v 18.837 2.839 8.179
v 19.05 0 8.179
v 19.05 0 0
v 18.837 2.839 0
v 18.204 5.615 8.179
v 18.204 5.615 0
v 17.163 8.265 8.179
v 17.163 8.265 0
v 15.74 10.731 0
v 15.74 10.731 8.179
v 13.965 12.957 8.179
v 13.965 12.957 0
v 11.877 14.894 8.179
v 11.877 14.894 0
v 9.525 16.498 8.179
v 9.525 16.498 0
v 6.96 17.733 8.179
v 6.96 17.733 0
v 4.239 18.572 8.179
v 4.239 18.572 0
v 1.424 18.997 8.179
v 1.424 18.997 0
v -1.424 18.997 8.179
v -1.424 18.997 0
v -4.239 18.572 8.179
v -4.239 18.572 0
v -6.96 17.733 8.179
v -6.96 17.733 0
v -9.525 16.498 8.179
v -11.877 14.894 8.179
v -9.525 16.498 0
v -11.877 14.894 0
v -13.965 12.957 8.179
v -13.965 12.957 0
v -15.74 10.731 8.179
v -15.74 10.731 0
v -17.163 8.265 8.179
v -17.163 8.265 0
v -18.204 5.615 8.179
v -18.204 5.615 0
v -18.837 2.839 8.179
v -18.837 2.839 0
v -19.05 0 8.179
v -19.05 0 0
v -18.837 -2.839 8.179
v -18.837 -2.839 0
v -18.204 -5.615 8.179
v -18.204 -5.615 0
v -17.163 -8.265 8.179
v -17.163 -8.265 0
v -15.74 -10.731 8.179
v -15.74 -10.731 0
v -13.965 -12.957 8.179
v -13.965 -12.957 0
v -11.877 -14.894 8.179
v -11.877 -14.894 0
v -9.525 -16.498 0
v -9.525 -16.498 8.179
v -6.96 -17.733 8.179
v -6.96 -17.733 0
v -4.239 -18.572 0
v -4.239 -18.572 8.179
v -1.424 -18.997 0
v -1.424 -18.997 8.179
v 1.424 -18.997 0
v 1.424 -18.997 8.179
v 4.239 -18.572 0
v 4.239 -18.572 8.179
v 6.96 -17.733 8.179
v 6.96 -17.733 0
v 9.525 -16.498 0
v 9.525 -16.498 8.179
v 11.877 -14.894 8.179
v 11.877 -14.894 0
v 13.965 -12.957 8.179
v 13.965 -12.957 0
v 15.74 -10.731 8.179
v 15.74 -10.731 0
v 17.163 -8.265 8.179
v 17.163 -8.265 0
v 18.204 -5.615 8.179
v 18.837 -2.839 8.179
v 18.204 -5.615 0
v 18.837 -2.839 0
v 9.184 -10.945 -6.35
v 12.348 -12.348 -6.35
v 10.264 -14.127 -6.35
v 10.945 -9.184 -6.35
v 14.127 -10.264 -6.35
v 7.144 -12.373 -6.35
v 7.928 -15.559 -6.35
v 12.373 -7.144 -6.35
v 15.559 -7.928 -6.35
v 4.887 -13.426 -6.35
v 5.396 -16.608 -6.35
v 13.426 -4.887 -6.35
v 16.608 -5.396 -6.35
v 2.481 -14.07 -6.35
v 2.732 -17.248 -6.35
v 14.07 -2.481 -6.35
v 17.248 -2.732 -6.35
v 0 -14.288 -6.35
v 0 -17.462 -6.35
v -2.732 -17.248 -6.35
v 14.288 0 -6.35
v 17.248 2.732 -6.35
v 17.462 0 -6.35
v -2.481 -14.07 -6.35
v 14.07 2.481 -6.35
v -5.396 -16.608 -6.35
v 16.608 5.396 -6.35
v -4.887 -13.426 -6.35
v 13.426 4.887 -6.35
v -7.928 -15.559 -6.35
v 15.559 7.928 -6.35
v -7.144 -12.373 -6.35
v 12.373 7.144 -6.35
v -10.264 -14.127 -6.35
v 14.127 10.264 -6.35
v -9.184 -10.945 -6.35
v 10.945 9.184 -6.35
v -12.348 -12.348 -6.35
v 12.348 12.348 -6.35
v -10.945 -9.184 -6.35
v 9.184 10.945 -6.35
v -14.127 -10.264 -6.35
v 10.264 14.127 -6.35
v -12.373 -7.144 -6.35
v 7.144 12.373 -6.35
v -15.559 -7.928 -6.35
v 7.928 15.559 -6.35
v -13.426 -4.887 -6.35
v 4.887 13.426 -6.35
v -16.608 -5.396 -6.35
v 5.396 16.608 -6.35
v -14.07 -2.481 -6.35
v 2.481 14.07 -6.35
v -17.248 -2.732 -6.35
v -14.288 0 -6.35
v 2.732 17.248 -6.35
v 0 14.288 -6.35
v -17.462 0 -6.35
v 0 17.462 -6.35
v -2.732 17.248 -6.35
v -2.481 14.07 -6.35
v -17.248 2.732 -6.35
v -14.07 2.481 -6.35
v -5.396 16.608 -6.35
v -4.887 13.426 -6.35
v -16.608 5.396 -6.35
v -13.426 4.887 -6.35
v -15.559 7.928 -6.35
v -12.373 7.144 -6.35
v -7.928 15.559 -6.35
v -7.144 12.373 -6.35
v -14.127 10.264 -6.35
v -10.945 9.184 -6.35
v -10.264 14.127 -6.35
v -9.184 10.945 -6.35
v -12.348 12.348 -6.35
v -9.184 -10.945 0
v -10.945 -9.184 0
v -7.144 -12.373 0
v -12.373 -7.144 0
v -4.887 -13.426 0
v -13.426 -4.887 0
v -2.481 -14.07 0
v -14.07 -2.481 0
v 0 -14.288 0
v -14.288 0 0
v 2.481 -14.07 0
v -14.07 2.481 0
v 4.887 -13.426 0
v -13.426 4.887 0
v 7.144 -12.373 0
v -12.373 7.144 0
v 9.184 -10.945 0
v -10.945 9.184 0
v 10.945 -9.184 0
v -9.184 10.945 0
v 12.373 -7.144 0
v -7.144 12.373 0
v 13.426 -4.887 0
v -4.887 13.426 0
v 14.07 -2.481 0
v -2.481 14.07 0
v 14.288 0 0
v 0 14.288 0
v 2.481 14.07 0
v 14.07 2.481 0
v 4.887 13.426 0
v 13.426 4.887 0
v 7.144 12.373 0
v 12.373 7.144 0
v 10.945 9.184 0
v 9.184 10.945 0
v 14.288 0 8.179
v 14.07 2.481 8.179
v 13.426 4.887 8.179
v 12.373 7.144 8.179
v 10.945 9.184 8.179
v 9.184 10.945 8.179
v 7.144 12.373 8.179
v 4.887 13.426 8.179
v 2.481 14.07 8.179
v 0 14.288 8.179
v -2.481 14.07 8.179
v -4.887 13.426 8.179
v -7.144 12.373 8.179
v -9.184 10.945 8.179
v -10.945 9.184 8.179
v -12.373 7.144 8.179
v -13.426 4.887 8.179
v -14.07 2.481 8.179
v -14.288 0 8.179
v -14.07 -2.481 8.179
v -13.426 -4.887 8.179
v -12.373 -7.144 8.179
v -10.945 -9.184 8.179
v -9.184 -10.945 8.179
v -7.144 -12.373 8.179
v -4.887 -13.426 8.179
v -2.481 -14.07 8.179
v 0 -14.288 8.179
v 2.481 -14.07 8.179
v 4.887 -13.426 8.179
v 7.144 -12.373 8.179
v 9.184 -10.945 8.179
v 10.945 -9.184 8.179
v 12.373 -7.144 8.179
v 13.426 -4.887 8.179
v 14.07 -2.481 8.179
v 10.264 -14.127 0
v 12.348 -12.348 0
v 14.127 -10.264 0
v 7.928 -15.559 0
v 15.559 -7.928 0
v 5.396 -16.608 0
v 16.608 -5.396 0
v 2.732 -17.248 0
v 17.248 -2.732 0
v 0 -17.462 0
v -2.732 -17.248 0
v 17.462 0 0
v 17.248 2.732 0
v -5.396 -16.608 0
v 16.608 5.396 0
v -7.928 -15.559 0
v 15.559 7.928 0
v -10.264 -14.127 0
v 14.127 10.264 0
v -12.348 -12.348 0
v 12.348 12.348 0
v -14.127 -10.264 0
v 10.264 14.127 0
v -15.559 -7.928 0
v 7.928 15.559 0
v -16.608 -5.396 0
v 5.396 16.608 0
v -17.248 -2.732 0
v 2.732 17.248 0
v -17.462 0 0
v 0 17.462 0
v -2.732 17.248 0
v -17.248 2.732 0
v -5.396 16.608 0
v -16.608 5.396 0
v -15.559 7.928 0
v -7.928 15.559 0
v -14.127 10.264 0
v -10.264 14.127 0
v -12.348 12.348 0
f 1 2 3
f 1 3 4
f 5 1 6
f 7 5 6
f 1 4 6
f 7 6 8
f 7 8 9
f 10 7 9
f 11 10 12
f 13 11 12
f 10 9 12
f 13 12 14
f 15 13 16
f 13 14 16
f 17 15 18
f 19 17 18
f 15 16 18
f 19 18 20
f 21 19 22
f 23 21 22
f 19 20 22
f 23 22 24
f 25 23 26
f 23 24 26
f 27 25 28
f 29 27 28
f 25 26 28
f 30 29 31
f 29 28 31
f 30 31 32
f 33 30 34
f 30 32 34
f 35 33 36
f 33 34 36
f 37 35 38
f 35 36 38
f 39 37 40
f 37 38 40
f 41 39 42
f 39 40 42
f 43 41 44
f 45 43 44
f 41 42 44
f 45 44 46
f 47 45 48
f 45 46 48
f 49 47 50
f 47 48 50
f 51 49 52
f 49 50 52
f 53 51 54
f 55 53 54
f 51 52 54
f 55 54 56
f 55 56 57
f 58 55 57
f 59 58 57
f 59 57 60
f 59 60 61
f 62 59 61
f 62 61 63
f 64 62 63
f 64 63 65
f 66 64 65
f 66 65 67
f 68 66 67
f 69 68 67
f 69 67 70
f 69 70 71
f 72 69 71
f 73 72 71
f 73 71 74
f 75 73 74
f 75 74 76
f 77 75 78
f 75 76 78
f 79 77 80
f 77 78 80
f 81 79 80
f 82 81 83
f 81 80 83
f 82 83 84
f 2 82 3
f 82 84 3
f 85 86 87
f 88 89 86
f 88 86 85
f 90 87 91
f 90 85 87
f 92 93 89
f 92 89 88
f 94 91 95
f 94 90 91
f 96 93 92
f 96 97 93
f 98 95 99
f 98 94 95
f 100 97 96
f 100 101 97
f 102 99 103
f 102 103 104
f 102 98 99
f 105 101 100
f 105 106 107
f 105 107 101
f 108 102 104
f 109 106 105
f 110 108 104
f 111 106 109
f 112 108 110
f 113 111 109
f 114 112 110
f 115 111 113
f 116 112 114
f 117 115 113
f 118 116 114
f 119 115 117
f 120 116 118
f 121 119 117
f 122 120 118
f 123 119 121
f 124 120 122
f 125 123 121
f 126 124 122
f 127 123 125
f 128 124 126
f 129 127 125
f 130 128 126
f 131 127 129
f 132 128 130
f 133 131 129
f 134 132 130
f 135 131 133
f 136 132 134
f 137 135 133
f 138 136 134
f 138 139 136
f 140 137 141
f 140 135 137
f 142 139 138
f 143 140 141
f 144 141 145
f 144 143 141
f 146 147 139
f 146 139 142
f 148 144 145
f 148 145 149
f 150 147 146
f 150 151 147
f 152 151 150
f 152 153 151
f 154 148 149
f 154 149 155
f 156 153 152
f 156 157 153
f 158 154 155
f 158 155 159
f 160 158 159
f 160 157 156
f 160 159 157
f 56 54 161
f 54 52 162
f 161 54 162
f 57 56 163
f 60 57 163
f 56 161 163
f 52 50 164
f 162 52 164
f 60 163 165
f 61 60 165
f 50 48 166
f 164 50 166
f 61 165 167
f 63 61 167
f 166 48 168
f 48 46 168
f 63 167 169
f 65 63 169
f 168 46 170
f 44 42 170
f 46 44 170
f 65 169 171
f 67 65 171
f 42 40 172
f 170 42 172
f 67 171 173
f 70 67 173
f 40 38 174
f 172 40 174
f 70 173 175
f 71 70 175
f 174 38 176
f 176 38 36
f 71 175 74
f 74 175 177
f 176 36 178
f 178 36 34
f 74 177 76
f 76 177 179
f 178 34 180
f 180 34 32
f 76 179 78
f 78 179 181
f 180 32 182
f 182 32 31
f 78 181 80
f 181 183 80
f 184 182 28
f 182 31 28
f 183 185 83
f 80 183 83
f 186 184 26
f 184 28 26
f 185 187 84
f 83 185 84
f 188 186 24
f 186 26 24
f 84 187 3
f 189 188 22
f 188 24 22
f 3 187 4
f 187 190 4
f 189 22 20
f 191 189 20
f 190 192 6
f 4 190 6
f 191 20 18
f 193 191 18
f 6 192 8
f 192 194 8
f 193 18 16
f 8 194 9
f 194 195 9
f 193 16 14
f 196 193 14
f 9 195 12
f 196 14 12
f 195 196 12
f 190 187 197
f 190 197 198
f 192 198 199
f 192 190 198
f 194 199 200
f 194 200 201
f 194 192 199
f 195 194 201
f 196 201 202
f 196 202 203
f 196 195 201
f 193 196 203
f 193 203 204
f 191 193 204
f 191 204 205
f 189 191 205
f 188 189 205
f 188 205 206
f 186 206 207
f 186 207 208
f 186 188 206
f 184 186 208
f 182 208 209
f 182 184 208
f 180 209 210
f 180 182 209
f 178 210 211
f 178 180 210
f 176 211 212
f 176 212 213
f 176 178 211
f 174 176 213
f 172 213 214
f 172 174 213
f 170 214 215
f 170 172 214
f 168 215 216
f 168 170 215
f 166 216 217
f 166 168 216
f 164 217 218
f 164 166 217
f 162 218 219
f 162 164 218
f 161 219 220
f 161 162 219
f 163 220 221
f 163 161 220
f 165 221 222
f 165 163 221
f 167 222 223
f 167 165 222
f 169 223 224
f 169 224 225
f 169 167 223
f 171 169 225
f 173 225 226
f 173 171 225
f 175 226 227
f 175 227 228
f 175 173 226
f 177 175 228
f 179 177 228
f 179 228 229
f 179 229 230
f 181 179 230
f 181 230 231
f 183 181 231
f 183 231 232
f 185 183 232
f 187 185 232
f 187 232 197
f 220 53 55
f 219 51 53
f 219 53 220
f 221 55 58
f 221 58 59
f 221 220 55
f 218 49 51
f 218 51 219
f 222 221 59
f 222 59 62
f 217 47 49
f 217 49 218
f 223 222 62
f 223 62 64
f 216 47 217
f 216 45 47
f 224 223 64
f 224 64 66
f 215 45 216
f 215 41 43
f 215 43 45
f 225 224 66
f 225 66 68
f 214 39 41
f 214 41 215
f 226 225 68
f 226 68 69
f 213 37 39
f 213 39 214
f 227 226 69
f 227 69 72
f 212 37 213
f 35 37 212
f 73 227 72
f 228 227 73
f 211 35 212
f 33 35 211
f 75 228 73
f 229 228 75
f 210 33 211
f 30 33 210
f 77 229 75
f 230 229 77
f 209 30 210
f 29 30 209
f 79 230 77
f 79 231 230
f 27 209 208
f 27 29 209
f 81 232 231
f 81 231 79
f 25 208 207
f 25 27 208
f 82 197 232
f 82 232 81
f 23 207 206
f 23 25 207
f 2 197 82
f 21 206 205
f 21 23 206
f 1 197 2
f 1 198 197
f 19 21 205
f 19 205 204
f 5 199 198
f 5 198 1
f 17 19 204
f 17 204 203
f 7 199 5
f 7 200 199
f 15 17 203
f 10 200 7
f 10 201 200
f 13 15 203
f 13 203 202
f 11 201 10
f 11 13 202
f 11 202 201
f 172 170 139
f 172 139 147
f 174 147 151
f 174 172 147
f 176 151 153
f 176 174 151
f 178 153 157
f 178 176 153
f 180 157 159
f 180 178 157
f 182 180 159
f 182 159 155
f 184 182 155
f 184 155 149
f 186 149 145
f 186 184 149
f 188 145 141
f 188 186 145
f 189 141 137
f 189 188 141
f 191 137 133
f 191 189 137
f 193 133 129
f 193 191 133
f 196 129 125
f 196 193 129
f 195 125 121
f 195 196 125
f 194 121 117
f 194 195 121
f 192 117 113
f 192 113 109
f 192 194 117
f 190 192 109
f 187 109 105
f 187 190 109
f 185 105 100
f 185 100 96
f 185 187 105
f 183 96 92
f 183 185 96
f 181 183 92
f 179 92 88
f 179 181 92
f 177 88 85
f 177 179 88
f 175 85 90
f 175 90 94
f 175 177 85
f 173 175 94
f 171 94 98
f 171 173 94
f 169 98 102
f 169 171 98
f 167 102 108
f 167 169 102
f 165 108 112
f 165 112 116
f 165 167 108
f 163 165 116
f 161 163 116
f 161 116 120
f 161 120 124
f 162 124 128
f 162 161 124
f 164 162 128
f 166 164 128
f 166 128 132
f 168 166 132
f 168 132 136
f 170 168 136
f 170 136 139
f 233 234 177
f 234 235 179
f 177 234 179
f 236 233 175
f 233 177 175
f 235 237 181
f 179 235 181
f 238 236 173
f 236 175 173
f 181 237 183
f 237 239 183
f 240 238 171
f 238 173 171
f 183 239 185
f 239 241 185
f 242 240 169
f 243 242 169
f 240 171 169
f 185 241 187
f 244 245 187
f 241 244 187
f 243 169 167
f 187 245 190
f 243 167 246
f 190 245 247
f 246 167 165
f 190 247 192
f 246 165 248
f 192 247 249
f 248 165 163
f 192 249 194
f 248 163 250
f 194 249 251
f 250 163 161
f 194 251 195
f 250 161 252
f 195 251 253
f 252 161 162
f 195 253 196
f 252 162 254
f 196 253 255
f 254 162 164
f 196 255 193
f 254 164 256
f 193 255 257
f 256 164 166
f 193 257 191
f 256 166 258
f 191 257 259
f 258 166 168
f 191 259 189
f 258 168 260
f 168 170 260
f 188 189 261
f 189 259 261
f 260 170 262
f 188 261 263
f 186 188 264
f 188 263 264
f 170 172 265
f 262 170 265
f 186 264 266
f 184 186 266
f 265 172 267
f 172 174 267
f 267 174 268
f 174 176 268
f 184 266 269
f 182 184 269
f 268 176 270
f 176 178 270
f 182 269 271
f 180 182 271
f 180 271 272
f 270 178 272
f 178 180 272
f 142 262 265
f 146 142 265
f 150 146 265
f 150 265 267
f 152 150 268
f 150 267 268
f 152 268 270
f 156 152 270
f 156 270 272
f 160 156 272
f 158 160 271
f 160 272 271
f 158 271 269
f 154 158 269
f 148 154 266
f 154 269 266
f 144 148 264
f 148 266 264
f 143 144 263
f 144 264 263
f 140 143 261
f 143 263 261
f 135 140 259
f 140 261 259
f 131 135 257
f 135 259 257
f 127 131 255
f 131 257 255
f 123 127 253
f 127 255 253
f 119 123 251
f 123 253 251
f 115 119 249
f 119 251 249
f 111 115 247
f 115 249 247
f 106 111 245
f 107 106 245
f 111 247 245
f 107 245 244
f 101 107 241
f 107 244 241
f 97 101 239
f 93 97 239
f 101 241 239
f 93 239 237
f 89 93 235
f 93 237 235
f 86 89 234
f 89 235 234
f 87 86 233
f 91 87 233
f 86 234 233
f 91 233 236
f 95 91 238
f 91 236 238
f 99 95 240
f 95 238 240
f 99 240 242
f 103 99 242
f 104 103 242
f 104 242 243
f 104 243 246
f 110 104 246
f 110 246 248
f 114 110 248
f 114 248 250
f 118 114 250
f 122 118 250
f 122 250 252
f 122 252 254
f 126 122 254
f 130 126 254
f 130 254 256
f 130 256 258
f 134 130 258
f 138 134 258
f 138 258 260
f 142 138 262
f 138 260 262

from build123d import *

# Parameters (mm, degrees)
SKETCH1_R           = 19.05
SKETCH1_R_2         = 14.2875
EXTRUDE_THIN1_DEPTH = 8.1788
SKETCH3_R           = 17.4625
SKETCH3_R_2         = 14.2875
BOSS_EXTRUDE1_DEPTH = 6.35


with BuildPart() as part:
    # Sketch1 → Extrude-Thin1 (new body)
    with BuildSketch(Plane.XY):
        Circle(SKETCH1_R)
        Circle(SKETCH1_R_2, mode=Mode.SUBTRACT)
    extrude(amount=EXTRUDE_THIN1_DEPTH)


with BuildPart() as body_2:
    # Sketch3 → Boss-Extrude1 (new body)
    with BuildSketch(Plane(origin=(0, 0, 0), x_dir=(-1, 0, 0), z_dir=(0, 0, -1))):
        Circle(SKETCH3_R)
        Circle(SKETCH3_R_2, mode=Mode.SUBTRACT)
    extrude(amount=BOSS_EXTRUDE1_DEPTH)


solid = Compound([part.part, body_2.part])
